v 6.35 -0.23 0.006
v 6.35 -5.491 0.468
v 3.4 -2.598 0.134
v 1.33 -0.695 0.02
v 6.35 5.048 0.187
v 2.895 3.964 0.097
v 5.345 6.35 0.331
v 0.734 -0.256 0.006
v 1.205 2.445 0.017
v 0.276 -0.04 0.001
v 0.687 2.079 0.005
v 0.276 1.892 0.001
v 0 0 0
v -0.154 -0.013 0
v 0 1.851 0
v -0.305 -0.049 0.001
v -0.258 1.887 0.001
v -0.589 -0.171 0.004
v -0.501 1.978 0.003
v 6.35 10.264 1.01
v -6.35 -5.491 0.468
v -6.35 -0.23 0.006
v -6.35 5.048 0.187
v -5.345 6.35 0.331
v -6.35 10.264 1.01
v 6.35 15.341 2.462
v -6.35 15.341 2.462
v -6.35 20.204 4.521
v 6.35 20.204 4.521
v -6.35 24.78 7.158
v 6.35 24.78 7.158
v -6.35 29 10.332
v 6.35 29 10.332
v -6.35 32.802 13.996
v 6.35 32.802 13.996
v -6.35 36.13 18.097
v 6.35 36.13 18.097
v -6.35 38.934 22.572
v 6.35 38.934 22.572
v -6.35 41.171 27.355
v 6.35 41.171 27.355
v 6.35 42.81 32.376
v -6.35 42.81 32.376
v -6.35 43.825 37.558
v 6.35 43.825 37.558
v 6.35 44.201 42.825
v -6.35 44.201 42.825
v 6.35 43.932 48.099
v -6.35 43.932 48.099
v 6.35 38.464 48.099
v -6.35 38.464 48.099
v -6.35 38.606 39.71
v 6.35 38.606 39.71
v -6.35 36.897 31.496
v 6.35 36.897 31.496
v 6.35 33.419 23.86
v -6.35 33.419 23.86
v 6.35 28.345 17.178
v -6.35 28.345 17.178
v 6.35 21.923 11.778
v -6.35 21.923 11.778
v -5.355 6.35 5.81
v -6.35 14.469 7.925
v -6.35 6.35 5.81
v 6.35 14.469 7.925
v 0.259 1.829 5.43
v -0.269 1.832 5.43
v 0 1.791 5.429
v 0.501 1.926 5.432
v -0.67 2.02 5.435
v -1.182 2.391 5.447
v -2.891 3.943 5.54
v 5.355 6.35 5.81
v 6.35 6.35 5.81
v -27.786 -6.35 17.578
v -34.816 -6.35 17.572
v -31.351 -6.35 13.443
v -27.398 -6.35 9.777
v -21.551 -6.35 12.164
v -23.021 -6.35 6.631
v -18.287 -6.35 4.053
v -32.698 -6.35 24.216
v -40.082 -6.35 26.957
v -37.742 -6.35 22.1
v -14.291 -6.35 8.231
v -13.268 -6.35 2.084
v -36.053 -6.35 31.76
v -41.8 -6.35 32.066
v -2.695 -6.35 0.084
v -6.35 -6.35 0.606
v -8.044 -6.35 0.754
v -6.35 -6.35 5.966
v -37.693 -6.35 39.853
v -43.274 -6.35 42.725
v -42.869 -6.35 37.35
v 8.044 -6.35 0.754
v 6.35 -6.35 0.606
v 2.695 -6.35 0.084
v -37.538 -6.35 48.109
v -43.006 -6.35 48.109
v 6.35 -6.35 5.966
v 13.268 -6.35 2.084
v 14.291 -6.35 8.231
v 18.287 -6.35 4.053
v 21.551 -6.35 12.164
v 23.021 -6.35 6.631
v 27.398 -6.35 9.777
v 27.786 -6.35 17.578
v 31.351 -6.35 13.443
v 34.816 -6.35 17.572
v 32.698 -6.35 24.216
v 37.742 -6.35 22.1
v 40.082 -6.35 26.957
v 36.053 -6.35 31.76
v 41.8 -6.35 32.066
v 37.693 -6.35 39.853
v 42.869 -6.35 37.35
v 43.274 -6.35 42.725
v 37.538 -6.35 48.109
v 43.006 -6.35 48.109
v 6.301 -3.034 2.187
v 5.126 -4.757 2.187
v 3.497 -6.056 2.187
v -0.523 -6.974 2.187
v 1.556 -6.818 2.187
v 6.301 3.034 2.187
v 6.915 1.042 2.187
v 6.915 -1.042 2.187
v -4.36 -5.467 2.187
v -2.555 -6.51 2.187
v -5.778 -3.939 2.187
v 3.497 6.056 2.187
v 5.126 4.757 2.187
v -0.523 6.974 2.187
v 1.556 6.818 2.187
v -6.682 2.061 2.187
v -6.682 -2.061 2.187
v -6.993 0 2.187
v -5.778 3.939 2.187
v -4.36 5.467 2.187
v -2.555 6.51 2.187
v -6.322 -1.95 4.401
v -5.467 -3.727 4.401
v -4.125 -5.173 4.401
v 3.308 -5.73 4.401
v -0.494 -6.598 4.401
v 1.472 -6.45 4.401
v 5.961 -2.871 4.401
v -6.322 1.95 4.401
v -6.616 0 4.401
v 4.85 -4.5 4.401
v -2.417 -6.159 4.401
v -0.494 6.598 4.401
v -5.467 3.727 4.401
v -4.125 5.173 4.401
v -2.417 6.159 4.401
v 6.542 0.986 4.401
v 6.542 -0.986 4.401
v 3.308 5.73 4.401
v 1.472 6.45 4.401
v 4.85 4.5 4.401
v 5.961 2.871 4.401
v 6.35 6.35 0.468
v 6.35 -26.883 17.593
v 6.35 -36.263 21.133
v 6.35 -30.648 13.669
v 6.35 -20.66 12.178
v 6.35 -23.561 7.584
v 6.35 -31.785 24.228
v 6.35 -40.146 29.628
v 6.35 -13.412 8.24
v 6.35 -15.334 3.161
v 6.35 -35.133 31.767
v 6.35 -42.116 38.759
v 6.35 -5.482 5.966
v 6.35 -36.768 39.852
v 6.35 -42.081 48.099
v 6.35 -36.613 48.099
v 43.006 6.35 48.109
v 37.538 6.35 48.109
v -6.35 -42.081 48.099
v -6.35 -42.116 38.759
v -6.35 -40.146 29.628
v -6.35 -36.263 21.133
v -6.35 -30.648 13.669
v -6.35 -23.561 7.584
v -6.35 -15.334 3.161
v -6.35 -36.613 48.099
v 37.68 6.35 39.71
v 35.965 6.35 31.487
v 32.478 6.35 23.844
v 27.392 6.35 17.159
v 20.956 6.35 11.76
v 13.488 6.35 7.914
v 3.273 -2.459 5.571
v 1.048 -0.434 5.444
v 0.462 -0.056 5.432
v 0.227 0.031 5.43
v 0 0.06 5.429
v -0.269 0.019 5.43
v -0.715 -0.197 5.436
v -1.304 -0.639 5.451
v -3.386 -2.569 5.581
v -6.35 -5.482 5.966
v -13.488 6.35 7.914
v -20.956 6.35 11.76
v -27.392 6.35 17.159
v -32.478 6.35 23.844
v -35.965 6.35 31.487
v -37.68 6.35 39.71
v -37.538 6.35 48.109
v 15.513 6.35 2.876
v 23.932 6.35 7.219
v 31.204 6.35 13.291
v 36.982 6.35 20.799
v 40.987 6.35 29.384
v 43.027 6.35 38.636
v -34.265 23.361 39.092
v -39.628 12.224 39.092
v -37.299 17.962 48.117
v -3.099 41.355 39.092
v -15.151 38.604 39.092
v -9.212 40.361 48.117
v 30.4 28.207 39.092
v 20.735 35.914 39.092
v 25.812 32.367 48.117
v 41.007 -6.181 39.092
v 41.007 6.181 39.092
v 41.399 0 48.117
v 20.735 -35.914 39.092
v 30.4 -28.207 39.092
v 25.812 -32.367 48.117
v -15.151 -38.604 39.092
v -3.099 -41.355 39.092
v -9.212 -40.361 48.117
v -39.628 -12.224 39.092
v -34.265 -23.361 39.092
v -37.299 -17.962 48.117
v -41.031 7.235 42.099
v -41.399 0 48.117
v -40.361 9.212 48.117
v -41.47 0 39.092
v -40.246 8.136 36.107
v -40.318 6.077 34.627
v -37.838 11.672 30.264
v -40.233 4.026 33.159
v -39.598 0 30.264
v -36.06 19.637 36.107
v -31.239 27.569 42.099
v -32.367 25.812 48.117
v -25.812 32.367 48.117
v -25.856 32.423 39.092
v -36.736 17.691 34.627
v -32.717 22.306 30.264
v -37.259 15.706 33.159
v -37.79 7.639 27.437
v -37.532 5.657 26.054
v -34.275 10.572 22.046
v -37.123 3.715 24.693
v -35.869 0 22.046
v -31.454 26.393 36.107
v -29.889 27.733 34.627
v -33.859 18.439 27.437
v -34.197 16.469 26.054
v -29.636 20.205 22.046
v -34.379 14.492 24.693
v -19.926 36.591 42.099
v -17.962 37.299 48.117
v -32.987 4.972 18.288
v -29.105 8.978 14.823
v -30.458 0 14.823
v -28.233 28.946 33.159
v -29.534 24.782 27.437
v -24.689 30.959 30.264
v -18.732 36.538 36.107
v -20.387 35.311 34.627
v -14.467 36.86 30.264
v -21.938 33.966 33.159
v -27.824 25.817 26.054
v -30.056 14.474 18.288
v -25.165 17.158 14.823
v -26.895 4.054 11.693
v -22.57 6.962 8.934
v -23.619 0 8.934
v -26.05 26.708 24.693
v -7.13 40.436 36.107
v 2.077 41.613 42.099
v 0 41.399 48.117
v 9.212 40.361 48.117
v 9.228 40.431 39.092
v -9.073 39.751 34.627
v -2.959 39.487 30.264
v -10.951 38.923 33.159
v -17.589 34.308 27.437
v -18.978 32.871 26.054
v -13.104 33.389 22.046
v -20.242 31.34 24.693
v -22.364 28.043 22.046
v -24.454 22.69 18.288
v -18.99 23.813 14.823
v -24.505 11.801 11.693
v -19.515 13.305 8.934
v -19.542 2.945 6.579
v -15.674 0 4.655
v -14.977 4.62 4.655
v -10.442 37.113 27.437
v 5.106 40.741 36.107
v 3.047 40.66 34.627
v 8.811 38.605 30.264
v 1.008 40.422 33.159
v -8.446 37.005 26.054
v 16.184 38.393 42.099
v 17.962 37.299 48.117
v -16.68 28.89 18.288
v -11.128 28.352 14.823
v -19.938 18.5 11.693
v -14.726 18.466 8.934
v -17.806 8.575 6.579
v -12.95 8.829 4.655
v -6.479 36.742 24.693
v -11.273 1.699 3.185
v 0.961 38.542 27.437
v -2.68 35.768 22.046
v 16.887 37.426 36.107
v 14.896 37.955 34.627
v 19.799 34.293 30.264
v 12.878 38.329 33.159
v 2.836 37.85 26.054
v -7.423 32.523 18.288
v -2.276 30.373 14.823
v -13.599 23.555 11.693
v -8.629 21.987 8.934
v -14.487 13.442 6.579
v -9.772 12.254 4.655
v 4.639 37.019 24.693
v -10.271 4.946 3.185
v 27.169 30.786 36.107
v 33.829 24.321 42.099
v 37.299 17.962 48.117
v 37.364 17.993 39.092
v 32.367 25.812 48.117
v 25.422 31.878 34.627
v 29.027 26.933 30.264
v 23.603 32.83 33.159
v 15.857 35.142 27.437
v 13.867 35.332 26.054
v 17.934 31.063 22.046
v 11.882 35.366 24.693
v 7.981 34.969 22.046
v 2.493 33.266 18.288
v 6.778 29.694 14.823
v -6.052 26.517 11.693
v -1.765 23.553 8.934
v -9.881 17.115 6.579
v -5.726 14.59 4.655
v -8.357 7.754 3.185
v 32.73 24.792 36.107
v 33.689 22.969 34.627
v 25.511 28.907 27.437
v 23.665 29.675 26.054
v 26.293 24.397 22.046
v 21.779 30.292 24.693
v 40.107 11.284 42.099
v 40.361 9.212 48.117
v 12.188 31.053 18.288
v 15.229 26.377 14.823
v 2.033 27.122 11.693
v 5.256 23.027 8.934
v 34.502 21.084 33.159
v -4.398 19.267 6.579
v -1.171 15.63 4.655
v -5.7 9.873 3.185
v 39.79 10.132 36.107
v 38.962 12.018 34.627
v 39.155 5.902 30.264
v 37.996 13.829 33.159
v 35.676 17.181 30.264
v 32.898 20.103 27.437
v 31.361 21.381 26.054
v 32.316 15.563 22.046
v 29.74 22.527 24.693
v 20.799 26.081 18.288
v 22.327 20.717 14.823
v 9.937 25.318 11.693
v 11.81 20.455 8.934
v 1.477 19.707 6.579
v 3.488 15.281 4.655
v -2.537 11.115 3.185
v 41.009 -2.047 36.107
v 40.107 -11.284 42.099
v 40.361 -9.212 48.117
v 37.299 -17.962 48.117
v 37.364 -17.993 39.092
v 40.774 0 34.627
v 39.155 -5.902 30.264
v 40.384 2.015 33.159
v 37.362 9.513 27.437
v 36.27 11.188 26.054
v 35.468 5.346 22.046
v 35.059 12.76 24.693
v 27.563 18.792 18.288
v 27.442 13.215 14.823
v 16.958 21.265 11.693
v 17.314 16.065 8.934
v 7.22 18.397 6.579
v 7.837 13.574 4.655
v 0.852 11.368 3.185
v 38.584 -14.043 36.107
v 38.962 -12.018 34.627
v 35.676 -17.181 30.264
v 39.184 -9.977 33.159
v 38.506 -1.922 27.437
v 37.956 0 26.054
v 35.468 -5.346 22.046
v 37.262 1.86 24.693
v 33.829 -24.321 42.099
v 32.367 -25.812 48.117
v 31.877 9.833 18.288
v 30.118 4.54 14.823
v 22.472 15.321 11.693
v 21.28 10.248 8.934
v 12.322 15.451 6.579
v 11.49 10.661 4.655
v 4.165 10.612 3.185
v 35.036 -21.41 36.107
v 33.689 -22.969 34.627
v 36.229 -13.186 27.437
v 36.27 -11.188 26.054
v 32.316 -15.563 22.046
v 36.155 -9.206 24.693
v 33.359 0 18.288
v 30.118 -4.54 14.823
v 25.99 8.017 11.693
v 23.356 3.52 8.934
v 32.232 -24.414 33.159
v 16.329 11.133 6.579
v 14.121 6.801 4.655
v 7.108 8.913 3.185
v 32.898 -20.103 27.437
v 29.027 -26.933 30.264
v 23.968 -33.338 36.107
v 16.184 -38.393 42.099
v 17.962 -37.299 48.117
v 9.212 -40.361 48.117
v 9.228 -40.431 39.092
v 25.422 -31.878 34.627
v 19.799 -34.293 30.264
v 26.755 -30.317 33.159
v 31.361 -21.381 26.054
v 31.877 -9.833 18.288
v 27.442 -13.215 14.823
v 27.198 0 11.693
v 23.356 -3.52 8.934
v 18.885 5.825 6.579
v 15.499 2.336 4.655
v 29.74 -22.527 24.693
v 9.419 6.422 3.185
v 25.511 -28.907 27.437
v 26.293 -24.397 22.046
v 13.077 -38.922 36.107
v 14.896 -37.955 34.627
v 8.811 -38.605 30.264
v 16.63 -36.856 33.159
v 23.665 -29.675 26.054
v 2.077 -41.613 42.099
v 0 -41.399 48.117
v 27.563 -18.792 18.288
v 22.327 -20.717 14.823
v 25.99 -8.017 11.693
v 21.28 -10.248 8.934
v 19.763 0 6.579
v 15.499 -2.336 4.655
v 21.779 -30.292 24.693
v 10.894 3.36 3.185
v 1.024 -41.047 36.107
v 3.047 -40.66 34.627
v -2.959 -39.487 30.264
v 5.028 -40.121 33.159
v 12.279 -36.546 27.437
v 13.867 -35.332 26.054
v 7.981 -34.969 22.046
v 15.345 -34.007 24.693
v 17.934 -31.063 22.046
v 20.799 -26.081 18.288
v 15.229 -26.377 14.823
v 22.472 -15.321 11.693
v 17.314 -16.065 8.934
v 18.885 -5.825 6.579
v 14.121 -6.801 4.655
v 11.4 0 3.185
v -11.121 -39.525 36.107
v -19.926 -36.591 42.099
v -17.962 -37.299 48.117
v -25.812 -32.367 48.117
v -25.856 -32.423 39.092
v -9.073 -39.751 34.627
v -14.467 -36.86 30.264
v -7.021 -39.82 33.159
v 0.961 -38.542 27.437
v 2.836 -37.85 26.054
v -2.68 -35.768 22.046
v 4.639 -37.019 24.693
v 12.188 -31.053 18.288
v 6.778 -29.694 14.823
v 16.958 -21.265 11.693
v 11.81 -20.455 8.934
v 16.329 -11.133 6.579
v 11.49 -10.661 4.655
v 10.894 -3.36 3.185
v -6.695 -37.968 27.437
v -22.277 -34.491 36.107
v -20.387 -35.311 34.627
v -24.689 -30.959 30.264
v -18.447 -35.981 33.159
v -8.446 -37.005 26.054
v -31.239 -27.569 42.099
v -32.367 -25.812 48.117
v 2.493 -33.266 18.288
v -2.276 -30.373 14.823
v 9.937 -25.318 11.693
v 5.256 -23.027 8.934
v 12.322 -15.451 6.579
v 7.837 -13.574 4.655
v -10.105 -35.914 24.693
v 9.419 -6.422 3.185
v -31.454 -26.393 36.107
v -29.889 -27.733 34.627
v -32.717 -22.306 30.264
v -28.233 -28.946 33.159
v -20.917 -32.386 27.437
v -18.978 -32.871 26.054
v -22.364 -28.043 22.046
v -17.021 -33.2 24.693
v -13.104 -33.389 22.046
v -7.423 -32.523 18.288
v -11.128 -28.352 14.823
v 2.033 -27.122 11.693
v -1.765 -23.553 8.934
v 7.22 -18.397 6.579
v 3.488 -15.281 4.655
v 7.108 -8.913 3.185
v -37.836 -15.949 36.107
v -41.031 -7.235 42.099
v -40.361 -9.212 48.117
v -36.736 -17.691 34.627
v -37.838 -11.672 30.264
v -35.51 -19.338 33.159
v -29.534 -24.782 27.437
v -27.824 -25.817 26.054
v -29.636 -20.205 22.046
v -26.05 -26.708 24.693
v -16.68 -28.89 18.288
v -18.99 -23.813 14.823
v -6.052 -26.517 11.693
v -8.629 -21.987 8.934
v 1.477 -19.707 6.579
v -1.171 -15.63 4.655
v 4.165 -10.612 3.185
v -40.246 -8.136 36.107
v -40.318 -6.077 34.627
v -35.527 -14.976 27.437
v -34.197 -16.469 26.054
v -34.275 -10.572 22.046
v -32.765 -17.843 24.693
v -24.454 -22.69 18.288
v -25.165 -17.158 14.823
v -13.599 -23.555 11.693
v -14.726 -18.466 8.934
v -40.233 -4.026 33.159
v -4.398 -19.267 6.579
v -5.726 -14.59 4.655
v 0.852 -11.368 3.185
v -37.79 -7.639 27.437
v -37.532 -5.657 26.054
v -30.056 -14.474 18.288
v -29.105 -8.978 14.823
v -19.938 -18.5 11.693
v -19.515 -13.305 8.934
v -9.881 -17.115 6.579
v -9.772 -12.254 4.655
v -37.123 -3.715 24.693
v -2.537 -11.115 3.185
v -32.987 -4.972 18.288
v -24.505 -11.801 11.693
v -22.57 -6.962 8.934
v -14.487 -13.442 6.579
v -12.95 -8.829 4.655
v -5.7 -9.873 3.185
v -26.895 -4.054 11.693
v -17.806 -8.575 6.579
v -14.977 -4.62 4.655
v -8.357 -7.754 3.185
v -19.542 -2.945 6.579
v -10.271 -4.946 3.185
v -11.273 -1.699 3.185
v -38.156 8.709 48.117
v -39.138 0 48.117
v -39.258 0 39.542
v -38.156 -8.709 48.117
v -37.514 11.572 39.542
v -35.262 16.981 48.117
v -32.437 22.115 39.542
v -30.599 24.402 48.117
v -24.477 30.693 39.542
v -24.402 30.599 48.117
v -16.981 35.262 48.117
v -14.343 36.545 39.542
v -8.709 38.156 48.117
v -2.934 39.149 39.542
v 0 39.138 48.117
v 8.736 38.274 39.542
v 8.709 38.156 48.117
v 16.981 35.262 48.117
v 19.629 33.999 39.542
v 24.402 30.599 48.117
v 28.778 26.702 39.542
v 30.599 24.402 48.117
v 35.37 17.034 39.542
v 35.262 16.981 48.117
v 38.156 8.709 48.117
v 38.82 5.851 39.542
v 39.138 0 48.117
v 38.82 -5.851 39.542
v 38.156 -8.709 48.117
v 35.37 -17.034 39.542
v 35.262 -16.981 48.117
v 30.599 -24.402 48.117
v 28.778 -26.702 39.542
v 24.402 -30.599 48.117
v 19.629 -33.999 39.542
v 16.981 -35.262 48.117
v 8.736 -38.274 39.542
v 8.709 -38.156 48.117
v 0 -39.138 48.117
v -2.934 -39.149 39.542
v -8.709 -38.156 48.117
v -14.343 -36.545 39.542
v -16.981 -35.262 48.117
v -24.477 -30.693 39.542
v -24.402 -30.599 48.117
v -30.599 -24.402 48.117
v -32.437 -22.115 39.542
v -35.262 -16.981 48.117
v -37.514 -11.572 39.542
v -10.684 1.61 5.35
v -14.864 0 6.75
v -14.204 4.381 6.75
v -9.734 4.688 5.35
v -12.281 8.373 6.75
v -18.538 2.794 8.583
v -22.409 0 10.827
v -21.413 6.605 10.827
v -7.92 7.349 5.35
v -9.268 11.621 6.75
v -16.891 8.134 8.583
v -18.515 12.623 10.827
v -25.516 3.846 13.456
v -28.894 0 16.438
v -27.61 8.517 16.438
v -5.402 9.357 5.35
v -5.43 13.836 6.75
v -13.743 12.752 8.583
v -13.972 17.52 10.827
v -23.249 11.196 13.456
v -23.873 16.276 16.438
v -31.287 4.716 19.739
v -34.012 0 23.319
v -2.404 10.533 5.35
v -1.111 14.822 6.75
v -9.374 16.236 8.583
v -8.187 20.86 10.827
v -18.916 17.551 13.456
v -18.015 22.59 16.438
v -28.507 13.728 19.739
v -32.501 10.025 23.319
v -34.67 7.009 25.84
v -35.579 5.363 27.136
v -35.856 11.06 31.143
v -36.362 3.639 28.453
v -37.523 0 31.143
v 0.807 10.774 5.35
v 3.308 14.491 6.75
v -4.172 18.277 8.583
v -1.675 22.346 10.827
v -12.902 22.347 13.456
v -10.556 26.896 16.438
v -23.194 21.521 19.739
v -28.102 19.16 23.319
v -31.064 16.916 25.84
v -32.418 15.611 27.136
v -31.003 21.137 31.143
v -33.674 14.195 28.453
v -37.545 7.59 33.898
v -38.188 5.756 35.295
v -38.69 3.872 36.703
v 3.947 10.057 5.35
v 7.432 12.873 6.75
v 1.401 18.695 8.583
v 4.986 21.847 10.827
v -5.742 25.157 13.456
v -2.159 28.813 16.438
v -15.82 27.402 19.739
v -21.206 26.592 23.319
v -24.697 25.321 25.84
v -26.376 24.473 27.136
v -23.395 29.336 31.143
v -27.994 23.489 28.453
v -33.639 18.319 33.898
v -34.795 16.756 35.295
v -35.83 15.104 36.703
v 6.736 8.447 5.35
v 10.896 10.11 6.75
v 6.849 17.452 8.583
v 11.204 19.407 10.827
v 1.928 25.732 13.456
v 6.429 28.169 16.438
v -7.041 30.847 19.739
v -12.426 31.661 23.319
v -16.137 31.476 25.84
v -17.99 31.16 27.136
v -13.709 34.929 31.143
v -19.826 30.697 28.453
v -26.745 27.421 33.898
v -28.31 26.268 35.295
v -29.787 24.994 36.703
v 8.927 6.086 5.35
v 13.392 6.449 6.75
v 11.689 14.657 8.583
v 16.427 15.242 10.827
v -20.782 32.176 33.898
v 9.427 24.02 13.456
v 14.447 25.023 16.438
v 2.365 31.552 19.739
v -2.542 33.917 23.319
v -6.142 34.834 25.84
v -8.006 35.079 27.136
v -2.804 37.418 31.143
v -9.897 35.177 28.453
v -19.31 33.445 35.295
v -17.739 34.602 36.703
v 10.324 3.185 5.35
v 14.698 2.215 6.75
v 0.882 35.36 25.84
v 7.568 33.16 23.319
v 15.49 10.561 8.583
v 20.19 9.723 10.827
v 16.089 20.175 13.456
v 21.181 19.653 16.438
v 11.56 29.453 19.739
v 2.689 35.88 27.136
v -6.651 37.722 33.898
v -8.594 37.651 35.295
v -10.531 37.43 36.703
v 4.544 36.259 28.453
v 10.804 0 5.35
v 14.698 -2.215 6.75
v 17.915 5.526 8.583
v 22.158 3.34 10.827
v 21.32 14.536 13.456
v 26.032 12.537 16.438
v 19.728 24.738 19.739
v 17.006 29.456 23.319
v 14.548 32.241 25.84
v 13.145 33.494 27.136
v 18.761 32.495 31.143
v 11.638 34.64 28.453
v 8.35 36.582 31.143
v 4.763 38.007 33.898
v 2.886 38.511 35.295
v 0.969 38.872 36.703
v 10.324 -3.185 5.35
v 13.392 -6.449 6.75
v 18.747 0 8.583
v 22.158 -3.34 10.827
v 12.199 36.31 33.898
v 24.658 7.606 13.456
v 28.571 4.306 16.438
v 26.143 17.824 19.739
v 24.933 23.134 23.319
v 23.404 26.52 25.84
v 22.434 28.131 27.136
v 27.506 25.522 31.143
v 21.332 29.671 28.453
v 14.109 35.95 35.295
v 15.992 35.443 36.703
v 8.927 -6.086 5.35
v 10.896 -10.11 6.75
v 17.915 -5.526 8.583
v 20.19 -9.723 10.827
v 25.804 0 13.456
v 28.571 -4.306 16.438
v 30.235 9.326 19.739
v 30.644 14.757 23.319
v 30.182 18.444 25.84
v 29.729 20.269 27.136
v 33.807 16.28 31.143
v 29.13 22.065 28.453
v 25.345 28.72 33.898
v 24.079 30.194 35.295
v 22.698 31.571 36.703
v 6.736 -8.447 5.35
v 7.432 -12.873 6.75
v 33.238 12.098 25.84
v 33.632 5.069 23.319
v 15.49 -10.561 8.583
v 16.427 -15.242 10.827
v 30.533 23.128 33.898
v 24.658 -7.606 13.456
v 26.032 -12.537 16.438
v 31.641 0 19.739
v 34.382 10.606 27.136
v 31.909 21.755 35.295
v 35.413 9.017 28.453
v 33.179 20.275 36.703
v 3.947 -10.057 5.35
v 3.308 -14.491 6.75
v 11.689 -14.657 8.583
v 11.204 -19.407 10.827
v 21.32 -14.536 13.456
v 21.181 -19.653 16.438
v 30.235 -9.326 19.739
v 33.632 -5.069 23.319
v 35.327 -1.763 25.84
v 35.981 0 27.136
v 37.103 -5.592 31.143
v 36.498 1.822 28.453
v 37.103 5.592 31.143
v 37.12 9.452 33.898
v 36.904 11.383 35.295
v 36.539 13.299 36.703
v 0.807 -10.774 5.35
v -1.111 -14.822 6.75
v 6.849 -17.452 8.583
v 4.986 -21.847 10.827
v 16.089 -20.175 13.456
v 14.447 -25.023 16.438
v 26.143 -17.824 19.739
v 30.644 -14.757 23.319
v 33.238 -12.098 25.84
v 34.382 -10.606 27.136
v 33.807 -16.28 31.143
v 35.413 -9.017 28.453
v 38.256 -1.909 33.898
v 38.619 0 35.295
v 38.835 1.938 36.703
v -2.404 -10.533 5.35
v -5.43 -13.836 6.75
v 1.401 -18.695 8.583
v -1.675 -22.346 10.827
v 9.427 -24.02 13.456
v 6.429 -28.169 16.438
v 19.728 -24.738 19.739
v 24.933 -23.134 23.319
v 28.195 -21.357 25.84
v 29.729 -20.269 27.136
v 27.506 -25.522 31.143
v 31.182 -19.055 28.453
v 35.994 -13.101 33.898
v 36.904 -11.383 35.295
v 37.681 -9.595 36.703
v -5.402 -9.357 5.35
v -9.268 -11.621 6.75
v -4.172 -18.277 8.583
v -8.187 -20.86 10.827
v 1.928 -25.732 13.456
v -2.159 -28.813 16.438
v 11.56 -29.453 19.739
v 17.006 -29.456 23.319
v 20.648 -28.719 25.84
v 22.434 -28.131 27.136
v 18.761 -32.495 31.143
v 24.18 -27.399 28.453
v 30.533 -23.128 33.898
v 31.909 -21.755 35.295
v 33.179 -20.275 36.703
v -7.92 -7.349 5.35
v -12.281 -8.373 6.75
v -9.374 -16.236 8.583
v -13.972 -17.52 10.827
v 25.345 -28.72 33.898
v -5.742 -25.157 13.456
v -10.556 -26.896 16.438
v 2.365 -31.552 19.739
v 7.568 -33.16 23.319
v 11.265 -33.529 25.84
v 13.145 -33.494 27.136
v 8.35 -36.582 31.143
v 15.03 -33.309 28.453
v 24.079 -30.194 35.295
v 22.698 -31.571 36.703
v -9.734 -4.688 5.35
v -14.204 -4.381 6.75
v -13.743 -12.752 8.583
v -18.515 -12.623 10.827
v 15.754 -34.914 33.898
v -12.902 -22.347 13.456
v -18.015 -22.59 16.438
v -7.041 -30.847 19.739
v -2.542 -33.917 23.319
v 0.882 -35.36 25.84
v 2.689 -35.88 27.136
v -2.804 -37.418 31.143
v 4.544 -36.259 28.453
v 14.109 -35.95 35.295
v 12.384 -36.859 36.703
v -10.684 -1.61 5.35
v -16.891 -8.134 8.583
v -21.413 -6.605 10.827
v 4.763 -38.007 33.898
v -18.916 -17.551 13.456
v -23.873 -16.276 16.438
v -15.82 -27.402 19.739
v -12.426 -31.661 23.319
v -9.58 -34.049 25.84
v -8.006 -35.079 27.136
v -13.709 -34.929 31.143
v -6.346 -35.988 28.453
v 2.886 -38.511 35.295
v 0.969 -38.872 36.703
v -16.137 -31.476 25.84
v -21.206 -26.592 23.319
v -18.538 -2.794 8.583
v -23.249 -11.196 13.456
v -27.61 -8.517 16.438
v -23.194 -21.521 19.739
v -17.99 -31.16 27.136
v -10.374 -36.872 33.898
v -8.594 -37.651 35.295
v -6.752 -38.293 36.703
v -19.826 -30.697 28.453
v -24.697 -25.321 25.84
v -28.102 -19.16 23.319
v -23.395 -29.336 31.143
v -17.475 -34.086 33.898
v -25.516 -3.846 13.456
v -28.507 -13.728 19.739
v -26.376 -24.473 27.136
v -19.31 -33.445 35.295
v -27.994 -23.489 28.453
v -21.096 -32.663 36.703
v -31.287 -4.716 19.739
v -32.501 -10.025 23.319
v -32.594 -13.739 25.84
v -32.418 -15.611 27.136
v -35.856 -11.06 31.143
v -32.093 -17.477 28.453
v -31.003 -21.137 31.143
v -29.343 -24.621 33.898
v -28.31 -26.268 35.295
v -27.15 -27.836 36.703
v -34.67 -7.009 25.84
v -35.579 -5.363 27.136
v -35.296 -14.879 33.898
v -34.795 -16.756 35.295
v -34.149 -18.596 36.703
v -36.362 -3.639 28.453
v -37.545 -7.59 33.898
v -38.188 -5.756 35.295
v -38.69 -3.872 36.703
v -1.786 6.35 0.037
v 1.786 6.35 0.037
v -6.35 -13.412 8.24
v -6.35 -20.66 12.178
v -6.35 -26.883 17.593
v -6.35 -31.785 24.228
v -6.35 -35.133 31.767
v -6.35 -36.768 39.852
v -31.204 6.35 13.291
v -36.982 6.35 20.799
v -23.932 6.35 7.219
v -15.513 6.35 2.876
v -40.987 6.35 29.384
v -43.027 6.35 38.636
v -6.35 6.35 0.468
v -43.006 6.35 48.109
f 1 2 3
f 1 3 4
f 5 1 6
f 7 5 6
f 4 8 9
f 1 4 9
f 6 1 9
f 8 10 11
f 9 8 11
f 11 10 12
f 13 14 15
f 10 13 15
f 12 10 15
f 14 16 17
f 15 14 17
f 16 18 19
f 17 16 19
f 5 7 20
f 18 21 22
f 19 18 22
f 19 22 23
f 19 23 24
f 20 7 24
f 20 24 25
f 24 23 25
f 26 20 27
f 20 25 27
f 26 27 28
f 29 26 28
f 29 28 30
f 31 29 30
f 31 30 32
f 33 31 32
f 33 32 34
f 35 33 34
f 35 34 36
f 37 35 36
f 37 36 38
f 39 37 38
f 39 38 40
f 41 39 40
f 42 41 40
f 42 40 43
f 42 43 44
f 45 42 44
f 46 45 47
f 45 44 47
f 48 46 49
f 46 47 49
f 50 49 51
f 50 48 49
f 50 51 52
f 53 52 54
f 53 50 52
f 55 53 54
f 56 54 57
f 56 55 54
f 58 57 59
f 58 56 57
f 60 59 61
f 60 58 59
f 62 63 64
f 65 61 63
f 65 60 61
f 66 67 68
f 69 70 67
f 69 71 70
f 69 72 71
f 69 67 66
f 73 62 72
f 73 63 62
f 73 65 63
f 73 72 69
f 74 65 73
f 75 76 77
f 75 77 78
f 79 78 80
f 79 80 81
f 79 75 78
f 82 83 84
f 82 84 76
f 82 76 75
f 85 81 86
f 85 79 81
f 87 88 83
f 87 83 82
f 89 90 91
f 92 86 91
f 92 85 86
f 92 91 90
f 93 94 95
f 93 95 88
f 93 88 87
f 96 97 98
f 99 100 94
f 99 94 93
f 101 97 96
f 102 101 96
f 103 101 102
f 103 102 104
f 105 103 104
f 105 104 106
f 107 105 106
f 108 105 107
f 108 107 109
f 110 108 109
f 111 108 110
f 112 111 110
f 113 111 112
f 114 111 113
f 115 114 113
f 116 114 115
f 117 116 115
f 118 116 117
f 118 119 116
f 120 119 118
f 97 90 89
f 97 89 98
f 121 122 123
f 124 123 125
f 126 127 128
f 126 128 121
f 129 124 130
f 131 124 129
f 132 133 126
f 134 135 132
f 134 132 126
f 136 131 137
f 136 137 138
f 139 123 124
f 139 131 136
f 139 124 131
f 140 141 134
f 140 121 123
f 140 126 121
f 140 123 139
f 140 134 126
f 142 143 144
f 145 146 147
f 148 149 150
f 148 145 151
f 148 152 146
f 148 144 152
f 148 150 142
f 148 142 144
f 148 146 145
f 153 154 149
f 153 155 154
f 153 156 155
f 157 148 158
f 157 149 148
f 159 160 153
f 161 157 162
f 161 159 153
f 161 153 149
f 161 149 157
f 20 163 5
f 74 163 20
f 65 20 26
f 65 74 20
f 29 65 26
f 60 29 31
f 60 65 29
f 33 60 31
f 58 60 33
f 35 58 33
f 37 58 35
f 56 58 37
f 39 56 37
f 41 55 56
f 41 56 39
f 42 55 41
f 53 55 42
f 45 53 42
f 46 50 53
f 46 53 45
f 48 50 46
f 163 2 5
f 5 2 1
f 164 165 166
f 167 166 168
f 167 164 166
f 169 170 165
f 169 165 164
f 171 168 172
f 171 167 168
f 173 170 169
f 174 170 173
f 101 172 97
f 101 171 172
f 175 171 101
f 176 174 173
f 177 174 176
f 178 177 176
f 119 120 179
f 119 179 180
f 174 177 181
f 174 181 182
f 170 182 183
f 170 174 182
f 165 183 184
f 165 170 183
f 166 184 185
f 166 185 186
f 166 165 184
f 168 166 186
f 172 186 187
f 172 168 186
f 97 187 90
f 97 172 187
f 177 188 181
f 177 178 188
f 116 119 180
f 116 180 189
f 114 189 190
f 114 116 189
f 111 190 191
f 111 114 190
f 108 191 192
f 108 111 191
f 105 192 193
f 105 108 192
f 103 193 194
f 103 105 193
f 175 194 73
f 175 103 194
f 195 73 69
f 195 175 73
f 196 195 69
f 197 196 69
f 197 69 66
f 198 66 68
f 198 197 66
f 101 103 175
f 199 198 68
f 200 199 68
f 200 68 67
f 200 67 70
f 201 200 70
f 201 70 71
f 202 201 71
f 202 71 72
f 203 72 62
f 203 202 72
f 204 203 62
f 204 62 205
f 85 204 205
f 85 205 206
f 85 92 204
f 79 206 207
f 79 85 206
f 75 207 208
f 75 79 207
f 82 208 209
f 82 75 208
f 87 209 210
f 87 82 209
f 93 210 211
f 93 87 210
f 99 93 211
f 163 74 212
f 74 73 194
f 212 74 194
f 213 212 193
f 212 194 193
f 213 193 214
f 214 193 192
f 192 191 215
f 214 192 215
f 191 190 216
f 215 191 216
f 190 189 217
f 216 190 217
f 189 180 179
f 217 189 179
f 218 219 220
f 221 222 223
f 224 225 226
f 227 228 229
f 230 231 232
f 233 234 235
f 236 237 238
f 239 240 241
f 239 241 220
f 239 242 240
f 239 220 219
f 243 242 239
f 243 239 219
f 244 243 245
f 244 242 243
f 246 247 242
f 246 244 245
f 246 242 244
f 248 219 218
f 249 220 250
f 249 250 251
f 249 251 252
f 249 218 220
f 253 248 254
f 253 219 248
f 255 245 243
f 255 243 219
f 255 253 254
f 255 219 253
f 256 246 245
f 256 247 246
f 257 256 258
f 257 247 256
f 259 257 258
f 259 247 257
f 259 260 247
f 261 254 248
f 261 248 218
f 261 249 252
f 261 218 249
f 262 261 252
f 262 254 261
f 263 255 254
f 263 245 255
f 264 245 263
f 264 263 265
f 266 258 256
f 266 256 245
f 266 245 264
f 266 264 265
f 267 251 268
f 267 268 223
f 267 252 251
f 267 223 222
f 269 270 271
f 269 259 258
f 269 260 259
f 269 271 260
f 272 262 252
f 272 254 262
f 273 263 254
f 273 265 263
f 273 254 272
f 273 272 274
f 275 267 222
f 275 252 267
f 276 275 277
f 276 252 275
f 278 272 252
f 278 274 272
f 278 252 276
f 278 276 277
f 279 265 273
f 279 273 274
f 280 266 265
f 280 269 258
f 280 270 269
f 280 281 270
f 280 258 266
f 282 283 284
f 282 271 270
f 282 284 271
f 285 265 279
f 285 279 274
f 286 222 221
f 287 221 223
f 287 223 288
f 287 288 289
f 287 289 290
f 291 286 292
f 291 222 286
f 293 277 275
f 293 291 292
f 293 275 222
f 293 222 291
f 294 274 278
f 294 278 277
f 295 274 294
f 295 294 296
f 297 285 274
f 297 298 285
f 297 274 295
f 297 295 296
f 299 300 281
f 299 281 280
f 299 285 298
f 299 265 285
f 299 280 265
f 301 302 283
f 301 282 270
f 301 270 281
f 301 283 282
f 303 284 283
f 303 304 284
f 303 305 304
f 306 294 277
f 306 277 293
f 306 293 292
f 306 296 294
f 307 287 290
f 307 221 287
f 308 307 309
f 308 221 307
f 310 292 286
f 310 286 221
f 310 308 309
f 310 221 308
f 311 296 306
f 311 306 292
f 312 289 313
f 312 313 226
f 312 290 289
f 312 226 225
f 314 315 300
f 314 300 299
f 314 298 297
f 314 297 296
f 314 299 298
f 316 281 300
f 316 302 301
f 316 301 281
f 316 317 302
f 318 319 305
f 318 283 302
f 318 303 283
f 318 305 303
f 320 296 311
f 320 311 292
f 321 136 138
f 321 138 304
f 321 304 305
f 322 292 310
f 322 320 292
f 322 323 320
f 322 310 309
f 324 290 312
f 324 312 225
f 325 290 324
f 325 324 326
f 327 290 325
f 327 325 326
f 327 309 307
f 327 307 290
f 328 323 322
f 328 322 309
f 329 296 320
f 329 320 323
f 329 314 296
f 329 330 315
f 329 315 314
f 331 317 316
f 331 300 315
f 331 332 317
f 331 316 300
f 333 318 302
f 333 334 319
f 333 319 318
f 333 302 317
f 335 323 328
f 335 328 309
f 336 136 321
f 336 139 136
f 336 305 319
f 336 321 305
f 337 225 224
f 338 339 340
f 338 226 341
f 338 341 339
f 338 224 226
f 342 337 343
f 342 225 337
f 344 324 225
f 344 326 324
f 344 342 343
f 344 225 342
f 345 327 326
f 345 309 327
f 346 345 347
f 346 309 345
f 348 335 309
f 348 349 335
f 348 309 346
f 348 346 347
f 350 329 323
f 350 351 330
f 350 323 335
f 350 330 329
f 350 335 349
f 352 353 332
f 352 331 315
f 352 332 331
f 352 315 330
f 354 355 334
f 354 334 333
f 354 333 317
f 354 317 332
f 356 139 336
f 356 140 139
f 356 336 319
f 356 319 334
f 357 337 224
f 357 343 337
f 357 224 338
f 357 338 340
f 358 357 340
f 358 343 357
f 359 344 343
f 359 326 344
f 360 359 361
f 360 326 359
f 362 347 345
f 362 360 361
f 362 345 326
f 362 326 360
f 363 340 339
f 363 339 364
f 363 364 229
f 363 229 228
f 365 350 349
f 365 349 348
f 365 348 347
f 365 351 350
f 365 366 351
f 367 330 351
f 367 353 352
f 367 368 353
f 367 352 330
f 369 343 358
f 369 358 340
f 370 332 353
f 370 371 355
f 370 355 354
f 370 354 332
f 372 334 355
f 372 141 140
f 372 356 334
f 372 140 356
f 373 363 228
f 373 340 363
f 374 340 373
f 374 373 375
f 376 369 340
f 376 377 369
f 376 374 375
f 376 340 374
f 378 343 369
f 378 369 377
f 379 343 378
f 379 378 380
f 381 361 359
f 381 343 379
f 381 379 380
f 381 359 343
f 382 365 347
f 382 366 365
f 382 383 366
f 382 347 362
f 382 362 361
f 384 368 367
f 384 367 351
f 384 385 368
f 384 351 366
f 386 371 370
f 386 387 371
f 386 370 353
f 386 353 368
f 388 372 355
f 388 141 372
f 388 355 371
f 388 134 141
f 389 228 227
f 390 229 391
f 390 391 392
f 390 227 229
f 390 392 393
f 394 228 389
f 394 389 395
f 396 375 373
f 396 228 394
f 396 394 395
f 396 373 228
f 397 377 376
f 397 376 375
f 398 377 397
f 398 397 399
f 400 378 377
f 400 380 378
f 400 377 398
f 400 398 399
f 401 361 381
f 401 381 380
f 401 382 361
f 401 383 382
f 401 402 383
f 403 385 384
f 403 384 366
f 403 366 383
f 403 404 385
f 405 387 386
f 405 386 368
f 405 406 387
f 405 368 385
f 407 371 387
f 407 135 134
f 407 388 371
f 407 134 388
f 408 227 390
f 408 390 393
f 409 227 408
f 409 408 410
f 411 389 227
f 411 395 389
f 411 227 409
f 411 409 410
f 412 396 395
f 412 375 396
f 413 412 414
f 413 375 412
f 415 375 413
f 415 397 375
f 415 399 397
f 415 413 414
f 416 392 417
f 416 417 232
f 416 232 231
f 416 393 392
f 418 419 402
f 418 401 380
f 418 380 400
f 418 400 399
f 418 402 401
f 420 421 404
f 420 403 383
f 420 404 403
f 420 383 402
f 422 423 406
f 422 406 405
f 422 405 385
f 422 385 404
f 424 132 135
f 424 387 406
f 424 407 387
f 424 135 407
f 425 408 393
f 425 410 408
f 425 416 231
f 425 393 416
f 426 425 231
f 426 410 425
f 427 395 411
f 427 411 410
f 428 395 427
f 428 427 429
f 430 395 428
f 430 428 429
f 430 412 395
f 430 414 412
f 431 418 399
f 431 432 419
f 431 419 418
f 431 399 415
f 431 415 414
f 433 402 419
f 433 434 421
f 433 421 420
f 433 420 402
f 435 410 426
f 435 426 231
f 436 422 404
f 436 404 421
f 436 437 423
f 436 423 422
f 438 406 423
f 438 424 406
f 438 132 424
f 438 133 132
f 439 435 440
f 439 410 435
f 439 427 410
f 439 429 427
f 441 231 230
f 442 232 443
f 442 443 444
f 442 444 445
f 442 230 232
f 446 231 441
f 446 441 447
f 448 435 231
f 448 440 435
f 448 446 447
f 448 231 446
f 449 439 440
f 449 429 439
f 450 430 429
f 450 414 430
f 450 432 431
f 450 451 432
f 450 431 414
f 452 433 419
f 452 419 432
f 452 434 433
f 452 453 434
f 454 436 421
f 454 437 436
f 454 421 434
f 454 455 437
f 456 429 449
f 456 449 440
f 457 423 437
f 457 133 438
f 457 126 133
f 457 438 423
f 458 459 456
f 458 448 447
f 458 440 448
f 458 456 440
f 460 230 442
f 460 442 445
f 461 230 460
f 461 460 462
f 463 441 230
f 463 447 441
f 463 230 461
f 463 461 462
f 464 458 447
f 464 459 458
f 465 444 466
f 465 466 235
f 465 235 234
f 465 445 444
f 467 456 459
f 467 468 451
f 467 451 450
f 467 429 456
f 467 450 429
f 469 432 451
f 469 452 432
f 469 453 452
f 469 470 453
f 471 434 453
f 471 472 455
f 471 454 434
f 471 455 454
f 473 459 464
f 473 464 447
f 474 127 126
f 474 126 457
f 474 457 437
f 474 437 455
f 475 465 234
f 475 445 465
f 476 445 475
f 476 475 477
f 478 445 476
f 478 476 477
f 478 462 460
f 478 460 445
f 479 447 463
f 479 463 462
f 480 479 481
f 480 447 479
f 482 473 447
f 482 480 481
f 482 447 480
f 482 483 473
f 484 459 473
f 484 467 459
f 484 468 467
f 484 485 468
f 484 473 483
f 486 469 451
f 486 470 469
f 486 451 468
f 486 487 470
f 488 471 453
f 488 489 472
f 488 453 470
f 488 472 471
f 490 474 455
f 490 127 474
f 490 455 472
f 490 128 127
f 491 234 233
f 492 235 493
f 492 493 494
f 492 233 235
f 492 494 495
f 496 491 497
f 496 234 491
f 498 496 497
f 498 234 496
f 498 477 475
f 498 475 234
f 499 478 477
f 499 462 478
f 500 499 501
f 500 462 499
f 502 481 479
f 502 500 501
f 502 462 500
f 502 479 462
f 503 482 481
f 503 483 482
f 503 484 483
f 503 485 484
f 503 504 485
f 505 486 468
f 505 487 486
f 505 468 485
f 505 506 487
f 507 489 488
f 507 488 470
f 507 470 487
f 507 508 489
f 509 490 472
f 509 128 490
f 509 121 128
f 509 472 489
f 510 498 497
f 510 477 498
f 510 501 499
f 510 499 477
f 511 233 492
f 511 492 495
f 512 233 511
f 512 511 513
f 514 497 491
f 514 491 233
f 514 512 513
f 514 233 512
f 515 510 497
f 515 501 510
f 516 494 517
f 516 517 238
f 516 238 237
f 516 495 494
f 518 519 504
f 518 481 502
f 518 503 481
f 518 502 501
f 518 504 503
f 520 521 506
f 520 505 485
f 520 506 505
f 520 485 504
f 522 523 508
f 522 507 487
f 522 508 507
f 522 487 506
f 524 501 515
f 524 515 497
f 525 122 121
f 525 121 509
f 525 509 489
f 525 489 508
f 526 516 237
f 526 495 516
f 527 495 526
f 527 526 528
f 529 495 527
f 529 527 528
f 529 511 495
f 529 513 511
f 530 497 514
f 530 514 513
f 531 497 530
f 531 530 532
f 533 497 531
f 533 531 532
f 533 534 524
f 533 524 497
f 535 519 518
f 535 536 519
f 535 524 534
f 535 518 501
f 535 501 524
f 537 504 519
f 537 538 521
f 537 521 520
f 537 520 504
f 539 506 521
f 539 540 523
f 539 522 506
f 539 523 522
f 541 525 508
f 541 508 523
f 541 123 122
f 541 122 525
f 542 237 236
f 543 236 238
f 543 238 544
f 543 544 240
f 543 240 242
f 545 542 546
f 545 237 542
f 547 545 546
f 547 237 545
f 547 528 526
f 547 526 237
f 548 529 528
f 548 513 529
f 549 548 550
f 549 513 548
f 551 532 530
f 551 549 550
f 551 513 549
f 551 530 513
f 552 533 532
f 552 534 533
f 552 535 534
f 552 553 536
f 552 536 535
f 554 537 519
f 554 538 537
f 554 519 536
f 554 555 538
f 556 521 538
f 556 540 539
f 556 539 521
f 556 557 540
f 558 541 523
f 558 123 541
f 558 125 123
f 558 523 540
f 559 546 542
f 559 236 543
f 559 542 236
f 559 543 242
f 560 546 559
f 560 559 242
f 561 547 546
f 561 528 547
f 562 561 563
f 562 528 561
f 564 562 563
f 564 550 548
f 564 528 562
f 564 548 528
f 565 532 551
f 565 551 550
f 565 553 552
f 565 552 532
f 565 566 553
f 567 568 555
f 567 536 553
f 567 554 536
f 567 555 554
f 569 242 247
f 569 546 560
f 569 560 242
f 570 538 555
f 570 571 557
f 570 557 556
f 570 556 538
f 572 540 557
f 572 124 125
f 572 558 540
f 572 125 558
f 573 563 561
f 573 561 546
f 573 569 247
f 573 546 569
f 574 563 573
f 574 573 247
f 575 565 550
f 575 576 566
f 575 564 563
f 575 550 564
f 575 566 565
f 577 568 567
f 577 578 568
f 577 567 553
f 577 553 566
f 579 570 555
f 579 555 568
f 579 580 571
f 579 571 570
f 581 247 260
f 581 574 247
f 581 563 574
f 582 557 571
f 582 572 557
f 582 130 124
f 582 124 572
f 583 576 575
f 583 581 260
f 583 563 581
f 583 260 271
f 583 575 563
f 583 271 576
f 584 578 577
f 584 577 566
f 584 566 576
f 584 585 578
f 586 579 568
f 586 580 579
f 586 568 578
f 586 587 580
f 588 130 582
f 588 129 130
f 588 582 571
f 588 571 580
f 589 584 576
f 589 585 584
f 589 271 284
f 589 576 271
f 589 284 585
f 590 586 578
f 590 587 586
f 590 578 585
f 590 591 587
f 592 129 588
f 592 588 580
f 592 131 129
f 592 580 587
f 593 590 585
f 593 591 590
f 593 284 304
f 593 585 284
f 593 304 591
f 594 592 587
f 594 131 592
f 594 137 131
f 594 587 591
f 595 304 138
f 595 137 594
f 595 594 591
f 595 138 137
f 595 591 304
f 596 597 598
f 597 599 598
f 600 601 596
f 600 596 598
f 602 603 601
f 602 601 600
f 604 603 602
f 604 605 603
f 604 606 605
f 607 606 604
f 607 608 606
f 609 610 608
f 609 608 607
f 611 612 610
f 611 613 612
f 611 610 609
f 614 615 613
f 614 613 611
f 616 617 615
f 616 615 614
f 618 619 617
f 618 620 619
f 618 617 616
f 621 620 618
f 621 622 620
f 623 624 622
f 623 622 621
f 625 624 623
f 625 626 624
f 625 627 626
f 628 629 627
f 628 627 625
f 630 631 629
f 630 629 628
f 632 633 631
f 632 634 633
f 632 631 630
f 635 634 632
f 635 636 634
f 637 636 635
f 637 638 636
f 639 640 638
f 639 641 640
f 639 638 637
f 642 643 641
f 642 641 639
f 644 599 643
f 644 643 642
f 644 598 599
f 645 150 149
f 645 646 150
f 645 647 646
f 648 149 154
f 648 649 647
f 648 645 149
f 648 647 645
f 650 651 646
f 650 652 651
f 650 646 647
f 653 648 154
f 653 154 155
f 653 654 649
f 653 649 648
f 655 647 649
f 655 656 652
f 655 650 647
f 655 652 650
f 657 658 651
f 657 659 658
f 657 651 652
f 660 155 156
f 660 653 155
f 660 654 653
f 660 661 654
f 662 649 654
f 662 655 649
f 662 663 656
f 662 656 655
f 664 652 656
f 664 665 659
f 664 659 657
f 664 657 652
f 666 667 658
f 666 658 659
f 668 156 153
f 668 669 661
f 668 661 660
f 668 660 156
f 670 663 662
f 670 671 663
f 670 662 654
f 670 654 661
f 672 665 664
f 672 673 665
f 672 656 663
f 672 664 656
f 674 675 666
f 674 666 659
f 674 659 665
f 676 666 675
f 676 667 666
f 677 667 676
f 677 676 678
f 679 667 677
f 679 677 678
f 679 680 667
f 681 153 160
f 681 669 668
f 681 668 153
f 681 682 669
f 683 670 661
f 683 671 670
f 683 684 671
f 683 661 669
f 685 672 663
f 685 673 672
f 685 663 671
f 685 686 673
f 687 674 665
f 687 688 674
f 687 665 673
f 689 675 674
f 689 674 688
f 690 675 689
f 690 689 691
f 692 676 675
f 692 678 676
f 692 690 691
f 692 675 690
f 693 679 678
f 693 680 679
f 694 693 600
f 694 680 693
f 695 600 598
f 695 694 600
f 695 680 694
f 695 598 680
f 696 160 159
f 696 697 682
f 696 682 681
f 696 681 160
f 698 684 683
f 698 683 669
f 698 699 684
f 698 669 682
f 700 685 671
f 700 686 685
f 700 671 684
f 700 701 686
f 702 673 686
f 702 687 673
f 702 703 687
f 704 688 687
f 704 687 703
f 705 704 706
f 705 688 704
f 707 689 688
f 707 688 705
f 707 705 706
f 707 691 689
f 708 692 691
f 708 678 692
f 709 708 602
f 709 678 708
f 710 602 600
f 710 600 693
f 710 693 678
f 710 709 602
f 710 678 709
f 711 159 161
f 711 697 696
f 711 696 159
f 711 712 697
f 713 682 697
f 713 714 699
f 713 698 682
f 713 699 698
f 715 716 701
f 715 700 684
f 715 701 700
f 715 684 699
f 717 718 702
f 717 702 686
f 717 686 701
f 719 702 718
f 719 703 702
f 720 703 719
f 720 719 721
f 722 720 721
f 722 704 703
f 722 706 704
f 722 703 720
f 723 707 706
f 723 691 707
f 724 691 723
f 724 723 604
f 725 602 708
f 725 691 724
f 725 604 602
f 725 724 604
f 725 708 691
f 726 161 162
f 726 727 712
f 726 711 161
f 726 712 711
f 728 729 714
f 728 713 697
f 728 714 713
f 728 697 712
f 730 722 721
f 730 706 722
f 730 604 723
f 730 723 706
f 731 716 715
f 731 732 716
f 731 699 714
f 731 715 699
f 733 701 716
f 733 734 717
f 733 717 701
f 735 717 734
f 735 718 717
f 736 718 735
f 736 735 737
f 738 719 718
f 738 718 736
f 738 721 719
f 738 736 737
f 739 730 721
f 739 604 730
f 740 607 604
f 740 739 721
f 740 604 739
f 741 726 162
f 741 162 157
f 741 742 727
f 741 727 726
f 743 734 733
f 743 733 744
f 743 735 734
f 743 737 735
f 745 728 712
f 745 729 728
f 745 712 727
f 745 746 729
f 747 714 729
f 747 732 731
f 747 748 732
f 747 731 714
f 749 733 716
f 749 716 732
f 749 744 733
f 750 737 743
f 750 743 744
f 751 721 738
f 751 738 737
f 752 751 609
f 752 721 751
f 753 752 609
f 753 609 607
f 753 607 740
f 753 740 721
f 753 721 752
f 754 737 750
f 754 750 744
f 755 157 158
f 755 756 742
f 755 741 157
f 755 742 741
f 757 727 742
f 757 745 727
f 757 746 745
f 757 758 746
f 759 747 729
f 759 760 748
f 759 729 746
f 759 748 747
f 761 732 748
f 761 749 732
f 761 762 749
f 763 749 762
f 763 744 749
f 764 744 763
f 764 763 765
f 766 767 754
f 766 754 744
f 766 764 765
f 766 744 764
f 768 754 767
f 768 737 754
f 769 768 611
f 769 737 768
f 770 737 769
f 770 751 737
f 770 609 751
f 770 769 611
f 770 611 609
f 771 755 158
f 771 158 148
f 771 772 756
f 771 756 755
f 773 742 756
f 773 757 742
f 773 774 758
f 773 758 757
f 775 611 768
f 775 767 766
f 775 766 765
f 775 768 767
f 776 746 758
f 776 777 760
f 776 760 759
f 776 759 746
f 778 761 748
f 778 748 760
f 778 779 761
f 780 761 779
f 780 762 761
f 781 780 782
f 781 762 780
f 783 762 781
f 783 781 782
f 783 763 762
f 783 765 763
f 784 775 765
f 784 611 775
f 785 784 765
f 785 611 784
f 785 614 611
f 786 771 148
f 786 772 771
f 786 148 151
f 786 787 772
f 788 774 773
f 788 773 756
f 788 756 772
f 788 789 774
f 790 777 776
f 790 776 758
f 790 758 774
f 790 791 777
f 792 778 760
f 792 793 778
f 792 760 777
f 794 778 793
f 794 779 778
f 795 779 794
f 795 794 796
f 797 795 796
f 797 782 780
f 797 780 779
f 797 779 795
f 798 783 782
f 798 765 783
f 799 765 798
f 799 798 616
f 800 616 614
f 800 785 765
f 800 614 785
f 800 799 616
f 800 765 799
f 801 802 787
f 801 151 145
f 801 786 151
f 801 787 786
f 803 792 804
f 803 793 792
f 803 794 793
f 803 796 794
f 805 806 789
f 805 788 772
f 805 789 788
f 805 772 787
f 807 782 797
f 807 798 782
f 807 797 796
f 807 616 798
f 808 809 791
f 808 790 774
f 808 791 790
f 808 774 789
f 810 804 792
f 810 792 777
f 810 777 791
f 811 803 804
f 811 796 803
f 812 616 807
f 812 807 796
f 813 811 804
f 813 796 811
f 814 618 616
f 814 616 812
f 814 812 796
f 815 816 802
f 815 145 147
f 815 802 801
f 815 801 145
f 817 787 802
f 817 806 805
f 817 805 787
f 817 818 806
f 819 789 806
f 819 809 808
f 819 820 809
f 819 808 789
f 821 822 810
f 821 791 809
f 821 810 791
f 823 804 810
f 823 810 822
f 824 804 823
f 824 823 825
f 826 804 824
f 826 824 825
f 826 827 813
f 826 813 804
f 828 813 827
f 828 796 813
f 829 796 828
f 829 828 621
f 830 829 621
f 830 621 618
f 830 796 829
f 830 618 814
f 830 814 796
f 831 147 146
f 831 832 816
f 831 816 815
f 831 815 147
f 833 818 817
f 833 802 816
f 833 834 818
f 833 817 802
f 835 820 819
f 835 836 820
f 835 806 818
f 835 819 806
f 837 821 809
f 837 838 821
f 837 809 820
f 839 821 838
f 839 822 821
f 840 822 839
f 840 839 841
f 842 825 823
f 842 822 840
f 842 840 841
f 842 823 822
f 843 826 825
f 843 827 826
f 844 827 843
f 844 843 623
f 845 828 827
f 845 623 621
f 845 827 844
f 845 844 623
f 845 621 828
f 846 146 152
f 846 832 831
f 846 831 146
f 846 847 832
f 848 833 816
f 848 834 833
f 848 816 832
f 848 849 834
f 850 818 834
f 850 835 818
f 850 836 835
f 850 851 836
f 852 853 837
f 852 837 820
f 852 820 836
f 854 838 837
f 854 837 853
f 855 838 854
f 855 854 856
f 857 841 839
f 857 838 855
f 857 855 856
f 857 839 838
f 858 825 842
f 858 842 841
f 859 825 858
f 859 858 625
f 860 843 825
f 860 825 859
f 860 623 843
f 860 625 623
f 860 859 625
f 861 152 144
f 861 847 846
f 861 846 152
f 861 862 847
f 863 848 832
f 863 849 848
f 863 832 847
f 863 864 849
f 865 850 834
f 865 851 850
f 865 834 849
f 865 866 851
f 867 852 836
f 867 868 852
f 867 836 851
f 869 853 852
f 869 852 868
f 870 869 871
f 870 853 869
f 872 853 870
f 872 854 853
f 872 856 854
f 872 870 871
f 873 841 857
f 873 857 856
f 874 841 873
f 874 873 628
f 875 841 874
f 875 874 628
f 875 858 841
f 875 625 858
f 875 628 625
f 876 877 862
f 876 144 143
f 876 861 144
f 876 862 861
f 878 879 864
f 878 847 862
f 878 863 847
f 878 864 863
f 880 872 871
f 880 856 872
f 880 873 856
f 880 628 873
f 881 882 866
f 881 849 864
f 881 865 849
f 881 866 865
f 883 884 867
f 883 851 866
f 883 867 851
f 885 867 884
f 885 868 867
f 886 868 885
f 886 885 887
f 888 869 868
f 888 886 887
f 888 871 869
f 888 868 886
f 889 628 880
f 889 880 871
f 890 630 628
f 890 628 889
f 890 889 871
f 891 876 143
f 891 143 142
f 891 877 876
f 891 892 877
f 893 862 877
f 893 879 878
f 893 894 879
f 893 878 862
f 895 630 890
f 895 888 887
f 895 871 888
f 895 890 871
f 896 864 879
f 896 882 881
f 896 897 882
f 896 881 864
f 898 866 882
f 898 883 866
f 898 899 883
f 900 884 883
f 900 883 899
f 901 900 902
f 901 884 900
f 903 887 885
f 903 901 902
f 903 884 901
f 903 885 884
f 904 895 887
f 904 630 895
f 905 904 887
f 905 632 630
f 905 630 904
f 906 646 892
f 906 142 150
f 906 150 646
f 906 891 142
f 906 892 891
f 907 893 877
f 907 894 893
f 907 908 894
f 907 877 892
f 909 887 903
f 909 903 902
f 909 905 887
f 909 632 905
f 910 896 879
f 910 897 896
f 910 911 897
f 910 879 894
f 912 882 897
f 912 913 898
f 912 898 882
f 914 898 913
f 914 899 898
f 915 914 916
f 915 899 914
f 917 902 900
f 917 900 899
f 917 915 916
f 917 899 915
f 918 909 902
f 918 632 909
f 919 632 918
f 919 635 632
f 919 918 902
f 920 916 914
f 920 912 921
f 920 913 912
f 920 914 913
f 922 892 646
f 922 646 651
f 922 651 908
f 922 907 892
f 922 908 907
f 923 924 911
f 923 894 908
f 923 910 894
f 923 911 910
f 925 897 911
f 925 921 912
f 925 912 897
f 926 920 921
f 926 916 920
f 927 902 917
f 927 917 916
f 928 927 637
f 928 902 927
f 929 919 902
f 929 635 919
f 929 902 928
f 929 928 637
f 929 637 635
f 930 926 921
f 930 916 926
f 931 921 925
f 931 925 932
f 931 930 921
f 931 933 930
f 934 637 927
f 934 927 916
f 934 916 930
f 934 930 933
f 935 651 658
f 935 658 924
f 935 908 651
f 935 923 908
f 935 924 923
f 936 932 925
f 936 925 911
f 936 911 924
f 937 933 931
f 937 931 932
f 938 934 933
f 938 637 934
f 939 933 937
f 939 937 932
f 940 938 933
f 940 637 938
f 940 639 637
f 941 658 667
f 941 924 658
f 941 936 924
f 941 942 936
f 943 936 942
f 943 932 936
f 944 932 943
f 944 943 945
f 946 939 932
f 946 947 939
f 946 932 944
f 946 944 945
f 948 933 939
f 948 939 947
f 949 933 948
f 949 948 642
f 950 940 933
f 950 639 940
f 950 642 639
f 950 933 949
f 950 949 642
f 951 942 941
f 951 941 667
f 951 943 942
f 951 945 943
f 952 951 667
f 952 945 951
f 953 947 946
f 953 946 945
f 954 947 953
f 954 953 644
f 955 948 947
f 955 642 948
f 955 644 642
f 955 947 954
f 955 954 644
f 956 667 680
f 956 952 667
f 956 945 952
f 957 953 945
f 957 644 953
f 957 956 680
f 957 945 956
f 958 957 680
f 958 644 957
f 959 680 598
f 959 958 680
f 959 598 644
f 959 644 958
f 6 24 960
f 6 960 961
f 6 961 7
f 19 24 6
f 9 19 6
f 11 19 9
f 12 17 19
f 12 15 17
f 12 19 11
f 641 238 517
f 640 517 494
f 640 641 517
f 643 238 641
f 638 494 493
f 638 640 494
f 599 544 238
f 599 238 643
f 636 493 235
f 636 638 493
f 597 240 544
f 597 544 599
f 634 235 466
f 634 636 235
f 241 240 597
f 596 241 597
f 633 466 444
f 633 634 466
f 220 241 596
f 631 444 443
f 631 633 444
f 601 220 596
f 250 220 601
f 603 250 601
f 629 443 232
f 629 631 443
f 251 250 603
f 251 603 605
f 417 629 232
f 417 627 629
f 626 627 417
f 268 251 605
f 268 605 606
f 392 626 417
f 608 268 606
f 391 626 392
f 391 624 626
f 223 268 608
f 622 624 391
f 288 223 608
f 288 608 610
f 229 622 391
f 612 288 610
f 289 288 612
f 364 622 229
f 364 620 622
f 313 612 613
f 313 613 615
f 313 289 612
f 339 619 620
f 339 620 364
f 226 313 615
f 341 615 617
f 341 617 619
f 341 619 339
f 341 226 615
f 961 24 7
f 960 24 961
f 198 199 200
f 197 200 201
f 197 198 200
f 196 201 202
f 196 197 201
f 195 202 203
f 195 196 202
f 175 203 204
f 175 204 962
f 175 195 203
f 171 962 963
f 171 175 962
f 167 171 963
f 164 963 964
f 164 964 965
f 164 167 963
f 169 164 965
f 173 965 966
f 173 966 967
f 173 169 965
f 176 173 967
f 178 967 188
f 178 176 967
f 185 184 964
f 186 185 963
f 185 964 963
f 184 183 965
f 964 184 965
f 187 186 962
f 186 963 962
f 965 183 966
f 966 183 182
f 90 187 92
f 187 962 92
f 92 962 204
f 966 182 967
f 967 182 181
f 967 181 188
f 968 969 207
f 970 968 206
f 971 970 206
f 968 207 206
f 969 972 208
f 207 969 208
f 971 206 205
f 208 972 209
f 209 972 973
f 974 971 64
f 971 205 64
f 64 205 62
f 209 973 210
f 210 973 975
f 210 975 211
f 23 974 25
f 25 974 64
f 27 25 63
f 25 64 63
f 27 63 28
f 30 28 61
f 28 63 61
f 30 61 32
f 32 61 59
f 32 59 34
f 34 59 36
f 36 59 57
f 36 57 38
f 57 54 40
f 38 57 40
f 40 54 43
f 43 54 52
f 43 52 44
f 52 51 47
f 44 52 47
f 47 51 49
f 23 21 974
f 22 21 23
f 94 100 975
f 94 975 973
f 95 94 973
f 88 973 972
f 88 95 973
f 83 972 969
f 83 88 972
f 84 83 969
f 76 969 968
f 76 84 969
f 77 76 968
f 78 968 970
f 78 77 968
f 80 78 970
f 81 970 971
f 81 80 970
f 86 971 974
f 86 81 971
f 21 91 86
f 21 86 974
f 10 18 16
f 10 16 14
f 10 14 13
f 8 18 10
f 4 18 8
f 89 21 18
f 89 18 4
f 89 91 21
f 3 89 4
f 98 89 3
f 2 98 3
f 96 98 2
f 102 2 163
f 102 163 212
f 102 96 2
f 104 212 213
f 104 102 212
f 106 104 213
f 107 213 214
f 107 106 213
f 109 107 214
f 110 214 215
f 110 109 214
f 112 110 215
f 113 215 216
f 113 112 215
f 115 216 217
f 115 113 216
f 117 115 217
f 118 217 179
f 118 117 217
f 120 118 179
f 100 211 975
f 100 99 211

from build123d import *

# Parameters (mm, degrees)
F1_DEPTH      = 6.35
F1_DEPTH_BACK = 6.35
F3_DEPTH      = 6.35
F3_DEPTH_BACK = 6.35


with BuildPart() as f1:
    # F0 (on Front) → F1 (new body, two sides)
    with BuildSketch(Plane.XZ) as f1_sk:
        with BuildLine():
            Line((-37.538346, 48.109349), (-43.006486, 48.109349))
            ThreePointArc((-43.006486, 48.109349), (0, 0), (43.006486, 48.109349))
            Line((43.006486, 48.109349), (37.538346, 48.109349))
            ThreePointArc((37.538346, 48.109349), (0, 5.42902), (-37.538346, 48.109349))
        make_face()
    extrude(amount=F1_DEPTH)
    extrude(f1_sk.sketch, amount=-F1_DEPTH_BACK)

    # F2 (on Right) → F3 (join, two sides)
    with BuildSketch(Plane.YZ) as f3_sk:
        with BuildLine():
            Line((-36.61262, 48.099446), (-42.080759, 48.099446))
            ThreePointArc((-42.080759, 48.099446), (0.925726, -0.009902), (43.932212, 48.099446))
            Line((43.932212, 48.099446), (38.464073, 48.099446))
            ThreePointArc((38.464073, 48.099446), (0.925726, 5.419118), (-36.61262, 48.099446))
        make_face()
    extrude(amount=F3_DEPTH)
    extrude(f3_sk.sketch, amount=-F3_DEPTH_BACK)


with BuildPart() as f5:
    # F4 (on Front) → F5 (revolve)
    with BuildSketch(Plane.XZ):
        with BuildLine():
            ThreePointArc((-6.616344, 4.400514), (-31.640616, 19.739115), (-39.137512, 48.116631))
            Line((-39.137512, 48.116631), (-41.399182, 48.116631))
            ThreePointArc((-41.399182, 48.116631), (-33.359245, 18.287632), (-6.993085, 2.186844))
            Line((-6.993085, 2.186844), (0, 2.186844))
            Line((0, 2.186844), (0, 4.400514))
            Line((0, 4.400514), (-6.616344, 4.400514))
        make_face()
    revolve(axis=Axis((0, 0, 3.293679), (0, 0, -1)))


solid = Compound([f1.part, f5.part])
